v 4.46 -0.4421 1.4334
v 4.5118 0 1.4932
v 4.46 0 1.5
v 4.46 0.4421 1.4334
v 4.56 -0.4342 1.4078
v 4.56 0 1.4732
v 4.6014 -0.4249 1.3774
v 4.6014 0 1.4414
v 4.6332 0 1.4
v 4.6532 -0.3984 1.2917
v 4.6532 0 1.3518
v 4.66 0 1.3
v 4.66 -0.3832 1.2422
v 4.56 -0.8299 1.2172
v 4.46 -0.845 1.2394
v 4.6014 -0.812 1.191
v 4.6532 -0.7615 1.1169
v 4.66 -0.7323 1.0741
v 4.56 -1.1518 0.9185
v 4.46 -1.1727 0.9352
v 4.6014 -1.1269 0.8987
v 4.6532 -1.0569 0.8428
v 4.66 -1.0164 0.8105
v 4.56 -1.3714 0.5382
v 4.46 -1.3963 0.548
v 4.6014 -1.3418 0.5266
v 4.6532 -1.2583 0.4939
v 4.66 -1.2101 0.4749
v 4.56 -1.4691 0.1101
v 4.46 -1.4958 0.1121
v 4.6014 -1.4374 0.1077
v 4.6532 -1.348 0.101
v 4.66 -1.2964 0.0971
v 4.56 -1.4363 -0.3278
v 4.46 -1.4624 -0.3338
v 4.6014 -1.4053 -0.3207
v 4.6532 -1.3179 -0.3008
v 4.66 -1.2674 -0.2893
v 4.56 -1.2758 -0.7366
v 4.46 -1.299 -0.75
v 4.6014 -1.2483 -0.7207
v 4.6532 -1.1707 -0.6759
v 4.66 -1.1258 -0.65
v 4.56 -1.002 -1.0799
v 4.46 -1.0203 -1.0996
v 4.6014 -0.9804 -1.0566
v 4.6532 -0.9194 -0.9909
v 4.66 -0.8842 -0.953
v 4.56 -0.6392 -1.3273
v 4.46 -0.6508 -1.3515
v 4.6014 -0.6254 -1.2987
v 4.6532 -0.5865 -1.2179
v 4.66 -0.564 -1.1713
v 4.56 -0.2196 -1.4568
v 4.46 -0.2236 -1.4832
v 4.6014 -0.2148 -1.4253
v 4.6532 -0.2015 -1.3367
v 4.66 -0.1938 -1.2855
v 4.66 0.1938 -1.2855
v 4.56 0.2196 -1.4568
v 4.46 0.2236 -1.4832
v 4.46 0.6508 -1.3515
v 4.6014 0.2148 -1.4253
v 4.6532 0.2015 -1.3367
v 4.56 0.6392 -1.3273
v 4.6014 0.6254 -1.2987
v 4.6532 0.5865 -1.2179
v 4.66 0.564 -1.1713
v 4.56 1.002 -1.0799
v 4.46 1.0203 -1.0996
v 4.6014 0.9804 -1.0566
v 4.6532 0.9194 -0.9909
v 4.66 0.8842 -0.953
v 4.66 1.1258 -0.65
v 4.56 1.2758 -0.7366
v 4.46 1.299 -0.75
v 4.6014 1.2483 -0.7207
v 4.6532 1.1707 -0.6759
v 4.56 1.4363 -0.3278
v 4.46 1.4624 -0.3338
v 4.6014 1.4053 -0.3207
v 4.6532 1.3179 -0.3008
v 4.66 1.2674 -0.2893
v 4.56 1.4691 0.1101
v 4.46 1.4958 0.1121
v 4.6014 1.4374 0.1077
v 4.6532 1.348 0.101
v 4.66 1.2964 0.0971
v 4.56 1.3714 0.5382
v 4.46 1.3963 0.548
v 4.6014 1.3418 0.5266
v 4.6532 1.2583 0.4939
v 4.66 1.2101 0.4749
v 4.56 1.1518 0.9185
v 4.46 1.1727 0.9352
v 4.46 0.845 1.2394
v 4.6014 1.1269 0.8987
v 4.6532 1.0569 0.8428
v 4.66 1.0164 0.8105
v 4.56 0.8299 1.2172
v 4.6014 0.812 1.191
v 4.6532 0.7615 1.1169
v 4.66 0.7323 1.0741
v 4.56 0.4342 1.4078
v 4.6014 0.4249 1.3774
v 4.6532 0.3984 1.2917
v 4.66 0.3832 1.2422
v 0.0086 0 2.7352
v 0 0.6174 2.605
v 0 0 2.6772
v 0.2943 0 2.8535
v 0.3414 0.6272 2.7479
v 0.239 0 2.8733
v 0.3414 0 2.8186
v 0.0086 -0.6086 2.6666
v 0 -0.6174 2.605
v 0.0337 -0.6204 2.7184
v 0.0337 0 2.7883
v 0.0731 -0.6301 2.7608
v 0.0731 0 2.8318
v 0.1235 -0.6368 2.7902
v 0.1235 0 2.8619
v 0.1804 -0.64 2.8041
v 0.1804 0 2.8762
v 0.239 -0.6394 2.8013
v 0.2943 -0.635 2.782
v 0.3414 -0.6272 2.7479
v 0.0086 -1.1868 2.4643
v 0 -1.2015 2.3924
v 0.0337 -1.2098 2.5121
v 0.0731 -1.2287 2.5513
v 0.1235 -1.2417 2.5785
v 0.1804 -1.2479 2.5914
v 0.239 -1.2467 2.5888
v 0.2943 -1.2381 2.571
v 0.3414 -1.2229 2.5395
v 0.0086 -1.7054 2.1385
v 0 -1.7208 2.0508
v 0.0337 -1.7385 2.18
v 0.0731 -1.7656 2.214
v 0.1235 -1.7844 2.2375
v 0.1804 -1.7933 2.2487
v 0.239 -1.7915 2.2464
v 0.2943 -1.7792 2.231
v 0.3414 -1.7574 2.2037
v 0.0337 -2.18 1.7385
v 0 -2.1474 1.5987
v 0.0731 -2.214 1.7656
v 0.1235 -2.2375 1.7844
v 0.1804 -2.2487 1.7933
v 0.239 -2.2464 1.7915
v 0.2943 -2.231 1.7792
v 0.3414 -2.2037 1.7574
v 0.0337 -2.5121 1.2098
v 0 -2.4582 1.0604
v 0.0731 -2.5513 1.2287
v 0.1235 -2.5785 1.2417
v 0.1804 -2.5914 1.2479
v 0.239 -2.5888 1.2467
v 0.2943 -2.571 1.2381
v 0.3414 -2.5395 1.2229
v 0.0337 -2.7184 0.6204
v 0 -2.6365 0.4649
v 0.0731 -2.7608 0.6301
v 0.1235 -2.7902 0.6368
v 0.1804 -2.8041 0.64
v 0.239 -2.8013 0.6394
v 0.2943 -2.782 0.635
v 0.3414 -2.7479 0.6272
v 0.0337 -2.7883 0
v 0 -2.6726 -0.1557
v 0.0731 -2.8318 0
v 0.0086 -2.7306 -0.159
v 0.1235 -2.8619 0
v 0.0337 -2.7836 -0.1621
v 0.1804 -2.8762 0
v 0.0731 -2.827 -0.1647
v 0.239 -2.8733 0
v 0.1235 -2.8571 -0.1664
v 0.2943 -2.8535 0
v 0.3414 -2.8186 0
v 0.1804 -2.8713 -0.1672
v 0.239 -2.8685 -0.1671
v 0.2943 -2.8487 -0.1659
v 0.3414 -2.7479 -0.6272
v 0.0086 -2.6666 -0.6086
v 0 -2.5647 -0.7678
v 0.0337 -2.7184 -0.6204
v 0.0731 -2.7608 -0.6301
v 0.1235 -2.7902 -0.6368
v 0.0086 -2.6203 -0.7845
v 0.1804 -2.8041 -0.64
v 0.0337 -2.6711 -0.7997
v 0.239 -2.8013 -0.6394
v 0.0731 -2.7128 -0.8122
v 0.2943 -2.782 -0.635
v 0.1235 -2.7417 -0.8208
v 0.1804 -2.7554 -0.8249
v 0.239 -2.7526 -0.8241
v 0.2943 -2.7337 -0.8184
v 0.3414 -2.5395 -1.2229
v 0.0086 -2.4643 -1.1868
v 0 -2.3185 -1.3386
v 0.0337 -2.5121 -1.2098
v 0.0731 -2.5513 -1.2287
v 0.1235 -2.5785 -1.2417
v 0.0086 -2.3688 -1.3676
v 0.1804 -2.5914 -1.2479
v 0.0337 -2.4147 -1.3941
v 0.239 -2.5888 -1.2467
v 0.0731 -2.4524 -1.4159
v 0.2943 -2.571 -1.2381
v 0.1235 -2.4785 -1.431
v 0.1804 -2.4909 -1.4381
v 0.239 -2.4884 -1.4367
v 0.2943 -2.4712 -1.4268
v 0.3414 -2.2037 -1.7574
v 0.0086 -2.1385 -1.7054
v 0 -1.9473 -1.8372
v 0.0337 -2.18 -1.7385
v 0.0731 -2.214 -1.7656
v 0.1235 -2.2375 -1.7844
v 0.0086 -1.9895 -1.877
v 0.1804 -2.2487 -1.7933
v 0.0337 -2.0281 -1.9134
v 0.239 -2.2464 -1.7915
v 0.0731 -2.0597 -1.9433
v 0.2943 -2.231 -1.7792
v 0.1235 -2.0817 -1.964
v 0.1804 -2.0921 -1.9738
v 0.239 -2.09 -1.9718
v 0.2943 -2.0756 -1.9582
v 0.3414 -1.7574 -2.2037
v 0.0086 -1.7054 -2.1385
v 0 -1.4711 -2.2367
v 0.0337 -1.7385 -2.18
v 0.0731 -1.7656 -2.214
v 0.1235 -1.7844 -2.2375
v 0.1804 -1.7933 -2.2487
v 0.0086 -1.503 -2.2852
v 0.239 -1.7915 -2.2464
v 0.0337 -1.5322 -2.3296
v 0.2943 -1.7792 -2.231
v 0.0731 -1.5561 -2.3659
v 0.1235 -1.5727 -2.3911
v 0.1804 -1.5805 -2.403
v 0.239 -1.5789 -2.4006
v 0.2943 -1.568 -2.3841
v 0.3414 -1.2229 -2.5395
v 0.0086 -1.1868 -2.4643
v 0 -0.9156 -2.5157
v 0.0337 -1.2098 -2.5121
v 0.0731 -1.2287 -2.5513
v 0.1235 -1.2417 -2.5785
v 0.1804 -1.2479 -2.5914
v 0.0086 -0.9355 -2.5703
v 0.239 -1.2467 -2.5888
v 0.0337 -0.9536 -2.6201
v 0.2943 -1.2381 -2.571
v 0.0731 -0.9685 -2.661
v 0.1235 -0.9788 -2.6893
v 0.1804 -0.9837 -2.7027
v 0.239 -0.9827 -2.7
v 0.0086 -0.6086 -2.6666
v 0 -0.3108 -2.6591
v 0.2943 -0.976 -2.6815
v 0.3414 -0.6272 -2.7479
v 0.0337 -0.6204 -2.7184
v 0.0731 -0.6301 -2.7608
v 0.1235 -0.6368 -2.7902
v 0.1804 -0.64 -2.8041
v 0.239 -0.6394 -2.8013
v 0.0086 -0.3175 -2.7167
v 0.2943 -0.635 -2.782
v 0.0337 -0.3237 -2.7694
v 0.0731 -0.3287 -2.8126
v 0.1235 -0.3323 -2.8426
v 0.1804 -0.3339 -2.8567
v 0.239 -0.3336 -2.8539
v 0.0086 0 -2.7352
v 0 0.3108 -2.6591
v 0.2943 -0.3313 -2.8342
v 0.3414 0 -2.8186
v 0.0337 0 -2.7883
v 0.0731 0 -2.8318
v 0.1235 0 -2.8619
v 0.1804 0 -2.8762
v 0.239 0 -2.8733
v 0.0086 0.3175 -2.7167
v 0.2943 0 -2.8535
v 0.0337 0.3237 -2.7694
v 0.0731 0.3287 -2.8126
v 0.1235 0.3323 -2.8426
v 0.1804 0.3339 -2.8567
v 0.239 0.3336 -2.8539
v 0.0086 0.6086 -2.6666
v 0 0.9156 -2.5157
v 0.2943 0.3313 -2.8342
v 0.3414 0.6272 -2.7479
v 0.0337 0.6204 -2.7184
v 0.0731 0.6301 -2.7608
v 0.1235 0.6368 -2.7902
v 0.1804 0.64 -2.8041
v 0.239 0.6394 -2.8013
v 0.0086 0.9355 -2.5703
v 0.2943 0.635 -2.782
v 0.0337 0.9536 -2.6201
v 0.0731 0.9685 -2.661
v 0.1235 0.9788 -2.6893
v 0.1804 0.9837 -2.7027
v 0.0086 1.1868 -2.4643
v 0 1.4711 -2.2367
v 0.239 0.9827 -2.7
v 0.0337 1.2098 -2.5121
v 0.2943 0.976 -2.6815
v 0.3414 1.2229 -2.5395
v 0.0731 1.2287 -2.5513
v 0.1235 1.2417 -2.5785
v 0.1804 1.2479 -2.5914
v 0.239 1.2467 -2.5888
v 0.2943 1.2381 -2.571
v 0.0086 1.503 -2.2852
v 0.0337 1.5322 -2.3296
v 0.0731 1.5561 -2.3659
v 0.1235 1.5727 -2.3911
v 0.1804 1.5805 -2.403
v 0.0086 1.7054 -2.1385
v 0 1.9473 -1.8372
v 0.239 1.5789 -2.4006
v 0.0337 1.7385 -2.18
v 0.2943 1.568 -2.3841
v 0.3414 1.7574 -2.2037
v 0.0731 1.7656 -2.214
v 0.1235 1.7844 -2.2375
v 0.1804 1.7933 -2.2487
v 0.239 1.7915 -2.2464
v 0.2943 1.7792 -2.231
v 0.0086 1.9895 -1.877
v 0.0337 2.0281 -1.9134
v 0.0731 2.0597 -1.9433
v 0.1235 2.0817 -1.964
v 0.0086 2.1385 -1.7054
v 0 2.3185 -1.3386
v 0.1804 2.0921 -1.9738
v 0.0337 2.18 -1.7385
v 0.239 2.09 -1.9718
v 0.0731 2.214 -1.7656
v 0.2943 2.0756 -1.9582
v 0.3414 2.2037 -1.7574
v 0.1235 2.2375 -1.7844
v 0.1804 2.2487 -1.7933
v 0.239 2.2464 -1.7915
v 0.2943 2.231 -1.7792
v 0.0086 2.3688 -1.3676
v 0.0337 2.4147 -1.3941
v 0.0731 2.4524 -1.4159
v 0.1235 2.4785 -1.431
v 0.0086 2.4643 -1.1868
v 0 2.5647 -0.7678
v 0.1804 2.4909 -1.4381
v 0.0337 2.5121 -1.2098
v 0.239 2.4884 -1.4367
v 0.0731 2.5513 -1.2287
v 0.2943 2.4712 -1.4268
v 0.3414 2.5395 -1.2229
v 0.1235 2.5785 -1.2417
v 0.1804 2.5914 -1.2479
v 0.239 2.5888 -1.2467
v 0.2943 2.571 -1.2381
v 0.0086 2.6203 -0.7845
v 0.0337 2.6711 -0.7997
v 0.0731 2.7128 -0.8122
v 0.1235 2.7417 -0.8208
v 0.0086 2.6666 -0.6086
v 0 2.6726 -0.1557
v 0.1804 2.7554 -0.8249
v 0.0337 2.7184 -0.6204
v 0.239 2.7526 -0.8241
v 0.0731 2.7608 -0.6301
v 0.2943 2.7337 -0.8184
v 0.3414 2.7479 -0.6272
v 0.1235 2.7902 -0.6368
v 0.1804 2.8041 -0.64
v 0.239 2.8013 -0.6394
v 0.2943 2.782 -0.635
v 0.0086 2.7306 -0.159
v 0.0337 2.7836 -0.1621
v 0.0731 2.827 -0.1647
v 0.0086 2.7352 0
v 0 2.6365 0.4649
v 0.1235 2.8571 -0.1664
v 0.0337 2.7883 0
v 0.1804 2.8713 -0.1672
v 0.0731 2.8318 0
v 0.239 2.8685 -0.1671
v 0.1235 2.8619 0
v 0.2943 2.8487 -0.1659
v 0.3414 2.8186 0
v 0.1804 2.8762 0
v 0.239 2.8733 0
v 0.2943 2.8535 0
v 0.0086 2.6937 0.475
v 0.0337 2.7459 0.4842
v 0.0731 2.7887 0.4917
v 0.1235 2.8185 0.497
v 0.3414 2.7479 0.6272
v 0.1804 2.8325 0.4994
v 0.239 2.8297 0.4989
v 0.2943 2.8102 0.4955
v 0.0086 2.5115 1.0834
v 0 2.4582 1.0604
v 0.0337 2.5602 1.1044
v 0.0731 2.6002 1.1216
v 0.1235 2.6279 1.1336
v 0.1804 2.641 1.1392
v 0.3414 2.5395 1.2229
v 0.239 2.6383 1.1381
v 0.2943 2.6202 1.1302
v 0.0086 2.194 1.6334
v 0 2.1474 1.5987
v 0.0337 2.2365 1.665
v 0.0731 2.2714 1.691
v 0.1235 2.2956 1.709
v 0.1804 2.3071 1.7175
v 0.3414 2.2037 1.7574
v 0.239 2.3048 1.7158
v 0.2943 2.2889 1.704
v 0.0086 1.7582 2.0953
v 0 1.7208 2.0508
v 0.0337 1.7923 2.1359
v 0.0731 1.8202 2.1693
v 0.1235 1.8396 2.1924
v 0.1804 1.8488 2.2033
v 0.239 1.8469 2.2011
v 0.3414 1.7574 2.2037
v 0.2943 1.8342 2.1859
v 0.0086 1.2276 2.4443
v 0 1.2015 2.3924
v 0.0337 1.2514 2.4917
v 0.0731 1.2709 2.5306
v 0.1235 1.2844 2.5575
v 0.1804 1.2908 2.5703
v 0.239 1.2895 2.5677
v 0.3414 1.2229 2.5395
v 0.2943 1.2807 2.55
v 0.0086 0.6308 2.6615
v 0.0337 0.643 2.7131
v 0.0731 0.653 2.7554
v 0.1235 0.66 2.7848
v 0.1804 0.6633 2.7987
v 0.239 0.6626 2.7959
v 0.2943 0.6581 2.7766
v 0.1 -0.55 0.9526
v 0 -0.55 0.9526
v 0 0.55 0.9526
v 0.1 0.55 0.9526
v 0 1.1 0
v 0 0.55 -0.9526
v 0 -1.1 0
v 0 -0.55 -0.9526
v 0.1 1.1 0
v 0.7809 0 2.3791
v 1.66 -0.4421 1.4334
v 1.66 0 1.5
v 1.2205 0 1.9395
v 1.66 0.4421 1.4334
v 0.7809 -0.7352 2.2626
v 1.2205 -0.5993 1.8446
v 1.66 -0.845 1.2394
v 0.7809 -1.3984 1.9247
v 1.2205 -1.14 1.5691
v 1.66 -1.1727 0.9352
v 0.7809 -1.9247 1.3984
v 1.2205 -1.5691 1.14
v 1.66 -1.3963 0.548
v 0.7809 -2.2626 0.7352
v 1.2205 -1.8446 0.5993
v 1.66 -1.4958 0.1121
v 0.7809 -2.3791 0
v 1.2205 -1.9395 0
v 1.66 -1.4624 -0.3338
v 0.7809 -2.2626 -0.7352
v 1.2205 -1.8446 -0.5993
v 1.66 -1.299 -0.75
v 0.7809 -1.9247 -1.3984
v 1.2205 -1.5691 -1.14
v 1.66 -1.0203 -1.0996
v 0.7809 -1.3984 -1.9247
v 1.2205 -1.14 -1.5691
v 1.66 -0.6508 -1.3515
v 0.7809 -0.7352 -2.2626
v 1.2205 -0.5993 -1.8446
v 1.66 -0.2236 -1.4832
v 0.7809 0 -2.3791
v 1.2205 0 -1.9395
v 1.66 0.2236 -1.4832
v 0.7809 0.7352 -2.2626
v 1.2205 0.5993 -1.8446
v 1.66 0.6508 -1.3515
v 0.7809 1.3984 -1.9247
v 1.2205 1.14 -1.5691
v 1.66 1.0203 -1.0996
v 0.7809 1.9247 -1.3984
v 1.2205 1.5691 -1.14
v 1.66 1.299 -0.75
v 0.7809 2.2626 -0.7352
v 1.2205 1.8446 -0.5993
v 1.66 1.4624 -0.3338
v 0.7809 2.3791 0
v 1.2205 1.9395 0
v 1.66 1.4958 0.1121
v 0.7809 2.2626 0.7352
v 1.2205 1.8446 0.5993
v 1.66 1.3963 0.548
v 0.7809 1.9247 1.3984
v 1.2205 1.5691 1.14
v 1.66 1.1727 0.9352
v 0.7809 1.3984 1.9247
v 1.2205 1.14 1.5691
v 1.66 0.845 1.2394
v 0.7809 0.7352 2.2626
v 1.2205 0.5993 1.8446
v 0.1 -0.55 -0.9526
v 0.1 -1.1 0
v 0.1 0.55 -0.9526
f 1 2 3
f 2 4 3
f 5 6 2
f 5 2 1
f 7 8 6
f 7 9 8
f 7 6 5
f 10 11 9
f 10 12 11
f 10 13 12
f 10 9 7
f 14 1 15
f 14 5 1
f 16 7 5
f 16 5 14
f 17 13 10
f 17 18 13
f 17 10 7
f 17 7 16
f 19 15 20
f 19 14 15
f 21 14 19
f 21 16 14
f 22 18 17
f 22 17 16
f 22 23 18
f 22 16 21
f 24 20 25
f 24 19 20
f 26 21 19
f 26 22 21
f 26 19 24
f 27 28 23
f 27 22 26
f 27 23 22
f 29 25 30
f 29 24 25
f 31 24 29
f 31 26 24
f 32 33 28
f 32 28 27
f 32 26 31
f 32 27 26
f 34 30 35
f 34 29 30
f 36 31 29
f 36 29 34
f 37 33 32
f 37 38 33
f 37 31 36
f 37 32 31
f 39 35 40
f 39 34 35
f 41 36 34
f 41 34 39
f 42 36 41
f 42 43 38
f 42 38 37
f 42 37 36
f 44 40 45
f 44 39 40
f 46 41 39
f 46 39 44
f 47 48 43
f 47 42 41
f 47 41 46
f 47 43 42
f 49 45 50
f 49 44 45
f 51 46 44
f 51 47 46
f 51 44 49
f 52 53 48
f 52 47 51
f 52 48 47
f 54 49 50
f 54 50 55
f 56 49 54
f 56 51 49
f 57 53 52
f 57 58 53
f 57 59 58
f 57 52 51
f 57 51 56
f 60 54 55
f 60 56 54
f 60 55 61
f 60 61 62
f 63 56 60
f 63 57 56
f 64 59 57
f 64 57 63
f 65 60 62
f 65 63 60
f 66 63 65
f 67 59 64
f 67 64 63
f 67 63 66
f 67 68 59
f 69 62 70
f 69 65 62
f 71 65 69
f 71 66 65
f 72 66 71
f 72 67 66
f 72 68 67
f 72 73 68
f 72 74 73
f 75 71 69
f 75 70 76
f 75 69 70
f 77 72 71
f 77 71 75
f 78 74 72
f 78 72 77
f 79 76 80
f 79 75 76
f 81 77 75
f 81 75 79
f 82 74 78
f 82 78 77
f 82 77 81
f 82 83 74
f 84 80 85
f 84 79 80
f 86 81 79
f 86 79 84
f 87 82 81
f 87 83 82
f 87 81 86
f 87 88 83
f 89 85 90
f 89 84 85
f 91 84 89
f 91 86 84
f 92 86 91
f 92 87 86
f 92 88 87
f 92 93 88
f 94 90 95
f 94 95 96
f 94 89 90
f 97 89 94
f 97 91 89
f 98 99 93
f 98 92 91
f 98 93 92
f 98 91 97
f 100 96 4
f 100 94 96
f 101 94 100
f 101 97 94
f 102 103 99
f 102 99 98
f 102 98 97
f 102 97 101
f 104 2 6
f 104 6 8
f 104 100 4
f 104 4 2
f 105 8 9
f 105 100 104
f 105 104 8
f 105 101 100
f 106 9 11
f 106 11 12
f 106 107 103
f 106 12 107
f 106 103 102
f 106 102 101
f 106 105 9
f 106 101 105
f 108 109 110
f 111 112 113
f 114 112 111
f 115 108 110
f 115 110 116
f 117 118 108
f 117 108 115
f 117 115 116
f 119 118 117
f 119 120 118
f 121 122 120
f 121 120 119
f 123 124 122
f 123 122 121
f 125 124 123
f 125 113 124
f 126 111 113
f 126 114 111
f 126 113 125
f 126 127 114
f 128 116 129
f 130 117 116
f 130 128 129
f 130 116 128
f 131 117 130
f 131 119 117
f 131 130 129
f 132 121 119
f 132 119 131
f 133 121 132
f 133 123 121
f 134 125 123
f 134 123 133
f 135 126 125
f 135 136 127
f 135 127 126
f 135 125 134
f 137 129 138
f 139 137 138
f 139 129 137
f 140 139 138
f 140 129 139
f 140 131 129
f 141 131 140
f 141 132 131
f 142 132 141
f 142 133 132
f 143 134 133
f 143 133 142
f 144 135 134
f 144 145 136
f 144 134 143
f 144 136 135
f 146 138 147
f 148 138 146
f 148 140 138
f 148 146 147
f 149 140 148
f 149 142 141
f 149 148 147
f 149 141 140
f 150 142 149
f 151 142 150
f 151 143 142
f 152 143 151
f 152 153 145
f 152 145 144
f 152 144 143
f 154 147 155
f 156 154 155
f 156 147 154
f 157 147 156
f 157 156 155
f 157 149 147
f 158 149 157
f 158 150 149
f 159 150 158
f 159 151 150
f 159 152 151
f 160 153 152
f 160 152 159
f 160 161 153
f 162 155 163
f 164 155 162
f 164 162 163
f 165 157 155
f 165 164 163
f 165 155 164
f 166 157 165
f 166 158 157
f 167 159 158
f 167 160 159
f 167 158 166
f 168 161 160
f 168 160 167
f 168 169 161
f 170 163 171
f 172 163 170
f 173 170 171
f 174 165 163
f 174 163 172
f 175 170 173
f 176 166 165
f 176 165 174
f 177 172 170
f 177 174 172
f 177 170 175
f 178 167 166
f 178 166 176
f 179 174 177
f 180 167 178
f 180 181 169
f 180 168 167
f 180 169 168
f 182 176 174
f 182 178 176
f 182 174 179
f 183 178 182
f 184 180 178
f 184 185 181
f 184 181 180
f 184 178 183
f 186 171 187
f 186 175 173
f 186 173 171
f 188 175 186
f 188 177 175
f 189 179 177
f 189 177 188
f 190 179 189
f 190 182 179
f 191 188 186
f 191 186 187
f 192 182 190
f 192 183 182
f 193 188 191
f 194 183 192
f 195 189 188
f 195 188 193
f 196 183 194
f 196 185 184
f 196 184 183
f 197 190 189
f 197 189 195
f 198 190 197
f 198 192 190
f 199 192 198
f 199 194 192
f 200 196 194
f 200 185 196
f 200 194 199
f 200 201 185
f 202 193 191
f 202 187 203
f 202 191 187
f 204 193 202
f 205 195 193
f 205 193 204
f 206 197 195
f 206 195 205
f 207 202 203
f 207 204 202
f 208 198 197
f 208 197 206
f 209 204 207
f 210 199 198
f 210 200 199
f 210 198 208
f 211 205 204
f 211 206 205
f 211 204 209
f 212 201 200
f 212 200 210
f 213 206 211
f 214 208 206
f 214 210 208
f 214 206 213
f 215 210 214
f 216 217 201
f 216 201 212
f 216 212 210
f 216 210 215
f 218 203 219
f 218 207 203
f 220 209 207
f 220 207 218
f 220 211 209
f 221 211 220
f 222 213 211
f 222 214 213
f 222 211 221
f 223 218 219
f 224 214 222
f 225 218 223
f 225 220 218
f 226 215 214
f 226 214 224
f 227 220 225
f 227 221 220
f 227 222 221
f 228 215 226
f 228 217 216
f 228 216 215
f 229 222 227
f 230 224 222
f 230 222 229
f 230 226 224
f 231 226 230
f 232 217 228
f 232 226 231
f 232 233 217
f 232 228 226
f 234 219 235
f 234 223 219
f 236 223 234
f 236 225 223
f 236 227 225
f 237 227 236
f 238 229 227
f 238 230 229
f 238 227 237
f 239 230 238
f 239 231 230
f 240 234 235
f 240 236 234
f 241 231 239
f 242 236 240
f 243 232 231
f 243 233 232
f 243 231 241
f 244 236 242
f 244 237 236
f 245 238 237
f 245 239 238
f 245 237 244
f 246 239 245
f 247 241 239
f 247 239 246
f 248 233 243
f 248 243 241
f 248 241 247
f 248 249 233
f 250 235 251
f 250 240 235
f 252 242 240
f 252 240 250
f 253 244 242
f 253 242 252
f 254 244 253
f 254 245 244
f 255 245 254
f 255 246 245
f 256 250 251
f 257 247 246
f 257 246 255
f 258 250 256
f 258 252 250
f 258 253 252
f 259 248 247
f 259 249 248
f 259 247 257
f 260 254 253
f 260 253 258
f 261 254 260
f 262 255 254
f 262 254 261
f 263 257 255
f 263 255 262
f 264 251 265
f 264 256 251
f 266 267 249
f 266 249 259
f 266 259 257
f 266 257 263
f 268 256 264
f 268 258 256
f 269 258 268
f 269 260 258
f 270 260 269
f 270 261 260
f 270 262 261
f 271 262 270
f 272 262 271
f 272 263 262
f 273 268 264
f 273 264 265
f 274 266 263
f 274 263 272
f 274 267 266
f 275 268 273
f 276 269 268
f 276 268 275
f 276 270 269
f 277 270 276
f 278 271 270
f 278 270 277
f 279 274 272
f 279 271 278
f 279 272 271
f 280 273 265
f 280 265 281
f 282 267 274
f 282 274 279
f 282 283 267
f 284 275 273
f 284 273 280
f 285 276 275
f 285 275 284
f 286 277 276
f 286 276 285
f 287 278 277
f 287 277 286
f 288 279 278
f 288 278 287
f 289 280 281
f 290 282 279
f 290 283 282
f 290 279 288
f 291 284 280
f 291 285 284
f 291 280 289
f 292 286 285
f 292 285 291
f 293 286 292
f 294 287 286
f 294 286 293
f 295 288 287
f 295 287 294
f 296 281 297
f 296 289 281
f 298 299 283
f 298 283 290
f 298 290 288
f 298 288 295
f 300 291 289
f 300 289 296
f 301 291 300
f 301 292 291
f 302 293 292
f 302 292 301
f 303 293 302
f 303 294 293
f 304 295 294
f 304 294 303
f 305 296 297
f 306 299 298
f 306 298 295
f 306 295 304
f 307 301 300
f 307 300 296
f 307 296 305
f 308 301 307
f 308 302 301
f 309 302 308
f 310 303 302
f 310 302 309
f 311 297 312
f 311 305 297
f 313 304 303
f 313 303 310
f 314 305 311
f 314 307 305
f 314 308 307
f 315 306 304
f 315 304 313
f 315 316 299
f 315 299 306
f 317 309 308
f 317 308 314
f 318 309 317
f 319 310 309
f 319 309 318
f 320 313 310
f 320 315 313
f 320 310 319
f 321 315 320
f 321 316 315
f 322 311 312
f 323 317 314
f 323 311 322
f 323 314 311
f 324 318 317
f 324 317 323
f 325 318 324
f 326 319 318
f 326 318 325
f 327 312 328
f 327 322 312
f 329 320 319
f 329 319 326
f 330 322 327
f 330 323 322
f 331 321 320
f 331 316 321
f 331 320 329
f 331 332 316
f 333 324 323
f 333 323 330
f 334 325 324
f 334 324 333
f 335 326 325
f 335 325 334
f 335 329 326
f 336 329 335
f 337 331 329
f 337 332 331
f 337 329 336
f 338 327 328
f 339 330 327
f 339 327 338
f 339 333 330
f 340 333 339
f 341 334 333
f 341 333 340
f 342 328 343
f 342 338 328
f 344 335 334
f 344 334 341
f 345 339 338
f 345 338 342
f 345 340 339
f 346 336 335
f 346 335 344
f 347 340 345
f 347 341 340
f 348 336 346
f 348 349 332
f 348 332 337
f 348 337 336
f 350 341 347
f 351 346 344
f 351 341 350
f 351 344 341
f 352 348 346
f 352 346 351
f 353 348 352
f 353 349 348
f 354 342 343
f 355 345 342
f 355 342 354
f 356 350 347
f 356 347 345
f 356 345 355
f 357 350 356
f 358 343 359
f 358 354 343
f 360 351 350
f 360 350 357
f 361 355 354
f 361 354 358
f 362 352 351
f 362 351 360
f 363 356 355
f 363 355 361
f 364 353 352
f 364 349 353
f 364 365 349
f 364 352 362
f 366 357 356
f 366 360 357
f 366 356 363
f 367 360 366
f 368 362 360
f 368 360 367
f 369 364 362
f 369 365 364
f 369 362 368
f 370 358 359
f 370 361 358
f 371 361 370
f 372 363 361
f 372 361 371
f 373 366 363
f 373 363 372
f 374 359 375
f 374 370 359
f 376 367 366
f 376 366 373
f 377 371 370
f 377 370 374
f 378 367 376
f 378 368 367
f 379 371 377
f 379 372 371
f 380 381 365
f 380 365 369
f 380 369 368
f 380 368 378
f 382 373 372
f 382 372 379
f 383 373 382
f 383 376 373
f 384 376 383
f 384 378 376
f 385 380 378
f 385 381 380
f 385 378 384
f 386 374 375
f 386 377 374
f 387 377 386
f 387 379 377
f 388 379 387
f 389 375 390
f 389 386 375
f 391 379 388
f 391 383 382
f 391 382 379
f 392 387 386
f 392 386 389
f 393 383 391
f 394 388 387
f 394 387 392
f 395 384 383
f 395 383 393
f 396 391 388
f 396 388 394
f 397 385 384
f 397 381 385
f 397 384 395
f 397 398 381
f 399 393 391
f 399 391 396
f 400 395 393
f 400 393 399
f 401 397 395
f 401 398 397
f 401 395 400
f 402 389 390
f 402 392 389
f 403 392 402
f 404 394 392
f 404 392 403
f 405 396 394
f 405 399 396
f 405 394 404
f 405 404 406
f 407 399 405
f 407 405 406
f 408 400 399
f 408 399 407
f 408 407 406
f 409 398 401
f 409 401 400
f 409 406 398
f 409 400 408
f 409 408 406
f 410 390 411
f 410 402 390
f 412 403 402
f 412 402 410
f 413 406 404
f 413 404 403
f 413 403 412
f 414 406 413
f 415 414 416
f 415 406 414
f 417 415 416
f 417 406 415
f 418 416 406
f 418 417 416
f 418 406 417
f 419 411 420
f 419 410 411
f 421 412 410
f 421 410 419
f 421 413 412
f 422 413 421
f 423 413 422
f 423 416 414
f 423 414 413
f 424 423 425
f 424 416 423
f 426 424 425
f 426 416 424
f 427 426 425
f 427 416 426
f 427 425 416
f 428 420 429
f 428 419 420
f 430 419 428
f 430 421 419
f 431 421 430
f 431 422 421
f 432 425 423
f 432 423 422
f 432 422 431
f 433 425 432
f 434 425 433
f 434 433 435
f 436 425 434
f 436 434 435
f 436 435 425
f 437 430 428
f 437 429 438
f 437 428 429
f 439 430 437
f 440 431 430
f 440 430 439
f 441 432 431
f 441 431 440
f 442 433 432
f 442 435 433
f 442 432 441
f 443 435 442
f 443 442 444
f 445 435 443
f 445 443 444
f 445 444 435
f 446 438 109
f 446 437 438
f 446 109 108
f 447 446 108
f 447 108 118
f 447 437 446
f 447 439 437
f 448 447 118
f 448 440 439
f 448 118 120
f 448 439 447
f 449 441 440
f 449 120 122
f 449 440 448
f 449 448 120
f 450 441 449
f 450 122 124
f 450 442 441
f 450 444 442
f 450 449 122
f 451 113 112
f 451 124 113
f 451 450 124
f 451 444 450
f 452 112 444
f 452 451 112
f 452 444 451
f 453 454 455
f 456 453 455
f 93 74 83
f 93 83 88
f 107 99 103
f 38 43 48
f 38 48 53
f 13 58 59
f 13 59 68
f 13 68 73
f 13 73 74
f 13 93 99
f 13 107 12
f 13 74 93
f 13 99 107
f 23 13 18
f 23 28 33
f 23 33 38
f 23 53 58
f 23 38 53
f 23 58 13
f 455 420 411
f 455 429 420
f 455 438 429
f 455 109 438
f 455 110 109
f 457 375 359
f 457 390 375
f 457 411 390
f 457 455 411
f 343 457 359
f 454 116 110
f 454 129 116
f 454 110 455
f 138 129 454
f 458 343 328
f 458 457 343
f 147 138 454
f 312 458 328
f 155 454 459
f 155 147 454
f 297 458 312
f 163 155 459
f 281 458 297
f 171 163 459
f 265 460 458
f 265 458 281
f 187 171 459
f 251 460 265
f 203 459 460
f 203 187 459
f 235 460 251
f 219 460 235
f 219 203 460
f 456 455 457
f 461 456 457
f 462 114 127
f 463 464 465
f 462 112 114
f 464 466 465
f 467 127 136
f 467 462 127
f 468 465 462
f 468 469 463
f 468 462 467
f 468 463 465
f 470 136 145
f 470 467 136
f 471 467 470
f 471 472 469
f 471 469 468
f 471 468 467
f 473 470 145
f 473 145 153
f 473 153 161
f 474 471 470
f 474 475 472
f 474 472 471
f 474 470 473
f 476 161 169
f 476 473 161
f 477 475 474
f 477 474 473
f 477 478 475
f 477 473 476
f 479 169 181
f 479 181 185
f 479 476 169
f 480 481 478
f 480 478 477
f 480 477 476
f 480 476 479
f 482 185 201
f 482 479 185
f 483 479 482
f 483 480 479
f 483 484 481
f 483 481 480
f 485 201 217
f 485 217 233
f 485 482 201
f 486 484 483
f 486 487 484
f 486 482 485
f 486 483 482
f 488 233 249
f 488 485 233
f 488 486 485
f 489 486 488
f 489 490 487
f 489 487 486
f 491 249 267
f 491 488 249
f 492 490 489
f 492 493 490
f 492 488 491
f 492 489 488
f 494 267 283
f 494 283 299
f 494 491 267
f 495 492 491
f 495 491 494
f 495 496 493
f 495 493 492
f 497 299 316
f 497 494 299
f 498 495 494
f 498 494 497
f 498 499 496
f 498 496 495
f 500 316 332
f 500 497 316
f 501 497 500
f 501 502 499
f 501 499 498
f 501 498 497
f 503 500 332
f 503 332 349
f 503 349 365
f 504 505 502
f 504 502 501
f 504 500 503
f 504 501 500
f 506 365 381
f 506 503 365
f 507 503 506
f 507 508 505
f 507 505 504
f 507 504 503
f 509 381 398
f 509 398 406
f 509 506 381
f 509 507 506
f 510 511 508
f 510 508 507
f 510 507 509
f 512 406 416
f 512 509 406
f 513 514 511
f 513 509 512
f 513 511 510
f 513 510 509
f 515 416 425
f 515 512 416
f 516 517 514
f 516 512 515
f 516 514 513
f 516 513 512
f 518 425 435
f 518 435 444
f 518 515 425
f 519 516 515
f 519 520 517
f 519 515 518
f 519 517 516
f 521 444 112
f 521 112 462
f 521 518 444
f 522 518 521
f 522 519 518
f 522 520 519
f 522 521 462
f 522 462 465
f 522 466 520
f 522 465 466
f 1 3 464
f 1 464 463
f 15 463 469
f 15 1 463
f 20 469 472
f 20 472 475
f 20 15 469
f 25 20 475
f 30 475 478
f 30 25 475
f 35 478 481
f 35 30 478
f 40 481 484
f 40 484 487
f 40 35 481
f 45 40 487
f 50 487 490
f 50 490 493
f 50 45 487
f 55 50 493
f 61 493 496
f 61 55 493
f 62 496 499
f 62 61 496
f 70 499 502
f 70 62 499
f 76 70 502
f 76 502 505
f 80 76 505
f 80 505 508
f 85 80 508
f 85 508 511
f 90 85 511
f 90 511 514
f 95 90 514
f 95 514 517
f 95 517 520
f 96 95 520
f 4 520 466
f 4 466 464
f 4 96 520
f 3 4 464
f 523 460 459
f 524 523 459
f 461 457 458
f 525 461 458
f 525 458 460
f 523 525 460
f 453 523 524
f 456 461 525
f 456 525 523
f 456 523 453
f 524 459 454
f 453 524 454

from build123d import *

# Parameters (mm, degrees)
ENL_V_MAT_EXTRU_1_DEPTH = 0.1
CONG_1_R                = 0.2


with BuildPart() as part:
    # Esquisse1 → Révolution1 (revolve)
    with BuildSketch(Plane.XY, mode=Mode.PRIVATE) as r_volution1_sk:
        Polygon((0, 0), (0, 3.16), (1.66, 1.5), (4.66, 1.5), (4.66, 0), align=None)
    revolve(r_volution1_sk.sketch.rotate(Axis((-5.768945874, 0, 0), (1, 0, 0)), 90), axis=Axis((-5.768945874, 0, 0), (1, 0, 0)))

    # Esquisse2 → Enlèv. mat.-Extru.1 (cut)
    with BuildSketch(Plane.ZY):
        Polygon((0, -1.1), (0.952627944, -0.55), (0.952627944, 0.55), (0, 1.1), (-0.952627944, 0.55), (-0.952627944, -0.55), align=None)
    extrude(amount=-ENL_V_MAT_EXTRU_1_DEPTH, mode=Mode.SUBTRACT)

    # Congé1
    cong_1_edges = [part.edges().sort_by_distance(p)[0] for p in [
        (4.66, 0, -1.5),
        (0, 0, -3.16),
    ]]
    fillet(cong_1_edges, radius=CONG_1_R)


solid = part.part
